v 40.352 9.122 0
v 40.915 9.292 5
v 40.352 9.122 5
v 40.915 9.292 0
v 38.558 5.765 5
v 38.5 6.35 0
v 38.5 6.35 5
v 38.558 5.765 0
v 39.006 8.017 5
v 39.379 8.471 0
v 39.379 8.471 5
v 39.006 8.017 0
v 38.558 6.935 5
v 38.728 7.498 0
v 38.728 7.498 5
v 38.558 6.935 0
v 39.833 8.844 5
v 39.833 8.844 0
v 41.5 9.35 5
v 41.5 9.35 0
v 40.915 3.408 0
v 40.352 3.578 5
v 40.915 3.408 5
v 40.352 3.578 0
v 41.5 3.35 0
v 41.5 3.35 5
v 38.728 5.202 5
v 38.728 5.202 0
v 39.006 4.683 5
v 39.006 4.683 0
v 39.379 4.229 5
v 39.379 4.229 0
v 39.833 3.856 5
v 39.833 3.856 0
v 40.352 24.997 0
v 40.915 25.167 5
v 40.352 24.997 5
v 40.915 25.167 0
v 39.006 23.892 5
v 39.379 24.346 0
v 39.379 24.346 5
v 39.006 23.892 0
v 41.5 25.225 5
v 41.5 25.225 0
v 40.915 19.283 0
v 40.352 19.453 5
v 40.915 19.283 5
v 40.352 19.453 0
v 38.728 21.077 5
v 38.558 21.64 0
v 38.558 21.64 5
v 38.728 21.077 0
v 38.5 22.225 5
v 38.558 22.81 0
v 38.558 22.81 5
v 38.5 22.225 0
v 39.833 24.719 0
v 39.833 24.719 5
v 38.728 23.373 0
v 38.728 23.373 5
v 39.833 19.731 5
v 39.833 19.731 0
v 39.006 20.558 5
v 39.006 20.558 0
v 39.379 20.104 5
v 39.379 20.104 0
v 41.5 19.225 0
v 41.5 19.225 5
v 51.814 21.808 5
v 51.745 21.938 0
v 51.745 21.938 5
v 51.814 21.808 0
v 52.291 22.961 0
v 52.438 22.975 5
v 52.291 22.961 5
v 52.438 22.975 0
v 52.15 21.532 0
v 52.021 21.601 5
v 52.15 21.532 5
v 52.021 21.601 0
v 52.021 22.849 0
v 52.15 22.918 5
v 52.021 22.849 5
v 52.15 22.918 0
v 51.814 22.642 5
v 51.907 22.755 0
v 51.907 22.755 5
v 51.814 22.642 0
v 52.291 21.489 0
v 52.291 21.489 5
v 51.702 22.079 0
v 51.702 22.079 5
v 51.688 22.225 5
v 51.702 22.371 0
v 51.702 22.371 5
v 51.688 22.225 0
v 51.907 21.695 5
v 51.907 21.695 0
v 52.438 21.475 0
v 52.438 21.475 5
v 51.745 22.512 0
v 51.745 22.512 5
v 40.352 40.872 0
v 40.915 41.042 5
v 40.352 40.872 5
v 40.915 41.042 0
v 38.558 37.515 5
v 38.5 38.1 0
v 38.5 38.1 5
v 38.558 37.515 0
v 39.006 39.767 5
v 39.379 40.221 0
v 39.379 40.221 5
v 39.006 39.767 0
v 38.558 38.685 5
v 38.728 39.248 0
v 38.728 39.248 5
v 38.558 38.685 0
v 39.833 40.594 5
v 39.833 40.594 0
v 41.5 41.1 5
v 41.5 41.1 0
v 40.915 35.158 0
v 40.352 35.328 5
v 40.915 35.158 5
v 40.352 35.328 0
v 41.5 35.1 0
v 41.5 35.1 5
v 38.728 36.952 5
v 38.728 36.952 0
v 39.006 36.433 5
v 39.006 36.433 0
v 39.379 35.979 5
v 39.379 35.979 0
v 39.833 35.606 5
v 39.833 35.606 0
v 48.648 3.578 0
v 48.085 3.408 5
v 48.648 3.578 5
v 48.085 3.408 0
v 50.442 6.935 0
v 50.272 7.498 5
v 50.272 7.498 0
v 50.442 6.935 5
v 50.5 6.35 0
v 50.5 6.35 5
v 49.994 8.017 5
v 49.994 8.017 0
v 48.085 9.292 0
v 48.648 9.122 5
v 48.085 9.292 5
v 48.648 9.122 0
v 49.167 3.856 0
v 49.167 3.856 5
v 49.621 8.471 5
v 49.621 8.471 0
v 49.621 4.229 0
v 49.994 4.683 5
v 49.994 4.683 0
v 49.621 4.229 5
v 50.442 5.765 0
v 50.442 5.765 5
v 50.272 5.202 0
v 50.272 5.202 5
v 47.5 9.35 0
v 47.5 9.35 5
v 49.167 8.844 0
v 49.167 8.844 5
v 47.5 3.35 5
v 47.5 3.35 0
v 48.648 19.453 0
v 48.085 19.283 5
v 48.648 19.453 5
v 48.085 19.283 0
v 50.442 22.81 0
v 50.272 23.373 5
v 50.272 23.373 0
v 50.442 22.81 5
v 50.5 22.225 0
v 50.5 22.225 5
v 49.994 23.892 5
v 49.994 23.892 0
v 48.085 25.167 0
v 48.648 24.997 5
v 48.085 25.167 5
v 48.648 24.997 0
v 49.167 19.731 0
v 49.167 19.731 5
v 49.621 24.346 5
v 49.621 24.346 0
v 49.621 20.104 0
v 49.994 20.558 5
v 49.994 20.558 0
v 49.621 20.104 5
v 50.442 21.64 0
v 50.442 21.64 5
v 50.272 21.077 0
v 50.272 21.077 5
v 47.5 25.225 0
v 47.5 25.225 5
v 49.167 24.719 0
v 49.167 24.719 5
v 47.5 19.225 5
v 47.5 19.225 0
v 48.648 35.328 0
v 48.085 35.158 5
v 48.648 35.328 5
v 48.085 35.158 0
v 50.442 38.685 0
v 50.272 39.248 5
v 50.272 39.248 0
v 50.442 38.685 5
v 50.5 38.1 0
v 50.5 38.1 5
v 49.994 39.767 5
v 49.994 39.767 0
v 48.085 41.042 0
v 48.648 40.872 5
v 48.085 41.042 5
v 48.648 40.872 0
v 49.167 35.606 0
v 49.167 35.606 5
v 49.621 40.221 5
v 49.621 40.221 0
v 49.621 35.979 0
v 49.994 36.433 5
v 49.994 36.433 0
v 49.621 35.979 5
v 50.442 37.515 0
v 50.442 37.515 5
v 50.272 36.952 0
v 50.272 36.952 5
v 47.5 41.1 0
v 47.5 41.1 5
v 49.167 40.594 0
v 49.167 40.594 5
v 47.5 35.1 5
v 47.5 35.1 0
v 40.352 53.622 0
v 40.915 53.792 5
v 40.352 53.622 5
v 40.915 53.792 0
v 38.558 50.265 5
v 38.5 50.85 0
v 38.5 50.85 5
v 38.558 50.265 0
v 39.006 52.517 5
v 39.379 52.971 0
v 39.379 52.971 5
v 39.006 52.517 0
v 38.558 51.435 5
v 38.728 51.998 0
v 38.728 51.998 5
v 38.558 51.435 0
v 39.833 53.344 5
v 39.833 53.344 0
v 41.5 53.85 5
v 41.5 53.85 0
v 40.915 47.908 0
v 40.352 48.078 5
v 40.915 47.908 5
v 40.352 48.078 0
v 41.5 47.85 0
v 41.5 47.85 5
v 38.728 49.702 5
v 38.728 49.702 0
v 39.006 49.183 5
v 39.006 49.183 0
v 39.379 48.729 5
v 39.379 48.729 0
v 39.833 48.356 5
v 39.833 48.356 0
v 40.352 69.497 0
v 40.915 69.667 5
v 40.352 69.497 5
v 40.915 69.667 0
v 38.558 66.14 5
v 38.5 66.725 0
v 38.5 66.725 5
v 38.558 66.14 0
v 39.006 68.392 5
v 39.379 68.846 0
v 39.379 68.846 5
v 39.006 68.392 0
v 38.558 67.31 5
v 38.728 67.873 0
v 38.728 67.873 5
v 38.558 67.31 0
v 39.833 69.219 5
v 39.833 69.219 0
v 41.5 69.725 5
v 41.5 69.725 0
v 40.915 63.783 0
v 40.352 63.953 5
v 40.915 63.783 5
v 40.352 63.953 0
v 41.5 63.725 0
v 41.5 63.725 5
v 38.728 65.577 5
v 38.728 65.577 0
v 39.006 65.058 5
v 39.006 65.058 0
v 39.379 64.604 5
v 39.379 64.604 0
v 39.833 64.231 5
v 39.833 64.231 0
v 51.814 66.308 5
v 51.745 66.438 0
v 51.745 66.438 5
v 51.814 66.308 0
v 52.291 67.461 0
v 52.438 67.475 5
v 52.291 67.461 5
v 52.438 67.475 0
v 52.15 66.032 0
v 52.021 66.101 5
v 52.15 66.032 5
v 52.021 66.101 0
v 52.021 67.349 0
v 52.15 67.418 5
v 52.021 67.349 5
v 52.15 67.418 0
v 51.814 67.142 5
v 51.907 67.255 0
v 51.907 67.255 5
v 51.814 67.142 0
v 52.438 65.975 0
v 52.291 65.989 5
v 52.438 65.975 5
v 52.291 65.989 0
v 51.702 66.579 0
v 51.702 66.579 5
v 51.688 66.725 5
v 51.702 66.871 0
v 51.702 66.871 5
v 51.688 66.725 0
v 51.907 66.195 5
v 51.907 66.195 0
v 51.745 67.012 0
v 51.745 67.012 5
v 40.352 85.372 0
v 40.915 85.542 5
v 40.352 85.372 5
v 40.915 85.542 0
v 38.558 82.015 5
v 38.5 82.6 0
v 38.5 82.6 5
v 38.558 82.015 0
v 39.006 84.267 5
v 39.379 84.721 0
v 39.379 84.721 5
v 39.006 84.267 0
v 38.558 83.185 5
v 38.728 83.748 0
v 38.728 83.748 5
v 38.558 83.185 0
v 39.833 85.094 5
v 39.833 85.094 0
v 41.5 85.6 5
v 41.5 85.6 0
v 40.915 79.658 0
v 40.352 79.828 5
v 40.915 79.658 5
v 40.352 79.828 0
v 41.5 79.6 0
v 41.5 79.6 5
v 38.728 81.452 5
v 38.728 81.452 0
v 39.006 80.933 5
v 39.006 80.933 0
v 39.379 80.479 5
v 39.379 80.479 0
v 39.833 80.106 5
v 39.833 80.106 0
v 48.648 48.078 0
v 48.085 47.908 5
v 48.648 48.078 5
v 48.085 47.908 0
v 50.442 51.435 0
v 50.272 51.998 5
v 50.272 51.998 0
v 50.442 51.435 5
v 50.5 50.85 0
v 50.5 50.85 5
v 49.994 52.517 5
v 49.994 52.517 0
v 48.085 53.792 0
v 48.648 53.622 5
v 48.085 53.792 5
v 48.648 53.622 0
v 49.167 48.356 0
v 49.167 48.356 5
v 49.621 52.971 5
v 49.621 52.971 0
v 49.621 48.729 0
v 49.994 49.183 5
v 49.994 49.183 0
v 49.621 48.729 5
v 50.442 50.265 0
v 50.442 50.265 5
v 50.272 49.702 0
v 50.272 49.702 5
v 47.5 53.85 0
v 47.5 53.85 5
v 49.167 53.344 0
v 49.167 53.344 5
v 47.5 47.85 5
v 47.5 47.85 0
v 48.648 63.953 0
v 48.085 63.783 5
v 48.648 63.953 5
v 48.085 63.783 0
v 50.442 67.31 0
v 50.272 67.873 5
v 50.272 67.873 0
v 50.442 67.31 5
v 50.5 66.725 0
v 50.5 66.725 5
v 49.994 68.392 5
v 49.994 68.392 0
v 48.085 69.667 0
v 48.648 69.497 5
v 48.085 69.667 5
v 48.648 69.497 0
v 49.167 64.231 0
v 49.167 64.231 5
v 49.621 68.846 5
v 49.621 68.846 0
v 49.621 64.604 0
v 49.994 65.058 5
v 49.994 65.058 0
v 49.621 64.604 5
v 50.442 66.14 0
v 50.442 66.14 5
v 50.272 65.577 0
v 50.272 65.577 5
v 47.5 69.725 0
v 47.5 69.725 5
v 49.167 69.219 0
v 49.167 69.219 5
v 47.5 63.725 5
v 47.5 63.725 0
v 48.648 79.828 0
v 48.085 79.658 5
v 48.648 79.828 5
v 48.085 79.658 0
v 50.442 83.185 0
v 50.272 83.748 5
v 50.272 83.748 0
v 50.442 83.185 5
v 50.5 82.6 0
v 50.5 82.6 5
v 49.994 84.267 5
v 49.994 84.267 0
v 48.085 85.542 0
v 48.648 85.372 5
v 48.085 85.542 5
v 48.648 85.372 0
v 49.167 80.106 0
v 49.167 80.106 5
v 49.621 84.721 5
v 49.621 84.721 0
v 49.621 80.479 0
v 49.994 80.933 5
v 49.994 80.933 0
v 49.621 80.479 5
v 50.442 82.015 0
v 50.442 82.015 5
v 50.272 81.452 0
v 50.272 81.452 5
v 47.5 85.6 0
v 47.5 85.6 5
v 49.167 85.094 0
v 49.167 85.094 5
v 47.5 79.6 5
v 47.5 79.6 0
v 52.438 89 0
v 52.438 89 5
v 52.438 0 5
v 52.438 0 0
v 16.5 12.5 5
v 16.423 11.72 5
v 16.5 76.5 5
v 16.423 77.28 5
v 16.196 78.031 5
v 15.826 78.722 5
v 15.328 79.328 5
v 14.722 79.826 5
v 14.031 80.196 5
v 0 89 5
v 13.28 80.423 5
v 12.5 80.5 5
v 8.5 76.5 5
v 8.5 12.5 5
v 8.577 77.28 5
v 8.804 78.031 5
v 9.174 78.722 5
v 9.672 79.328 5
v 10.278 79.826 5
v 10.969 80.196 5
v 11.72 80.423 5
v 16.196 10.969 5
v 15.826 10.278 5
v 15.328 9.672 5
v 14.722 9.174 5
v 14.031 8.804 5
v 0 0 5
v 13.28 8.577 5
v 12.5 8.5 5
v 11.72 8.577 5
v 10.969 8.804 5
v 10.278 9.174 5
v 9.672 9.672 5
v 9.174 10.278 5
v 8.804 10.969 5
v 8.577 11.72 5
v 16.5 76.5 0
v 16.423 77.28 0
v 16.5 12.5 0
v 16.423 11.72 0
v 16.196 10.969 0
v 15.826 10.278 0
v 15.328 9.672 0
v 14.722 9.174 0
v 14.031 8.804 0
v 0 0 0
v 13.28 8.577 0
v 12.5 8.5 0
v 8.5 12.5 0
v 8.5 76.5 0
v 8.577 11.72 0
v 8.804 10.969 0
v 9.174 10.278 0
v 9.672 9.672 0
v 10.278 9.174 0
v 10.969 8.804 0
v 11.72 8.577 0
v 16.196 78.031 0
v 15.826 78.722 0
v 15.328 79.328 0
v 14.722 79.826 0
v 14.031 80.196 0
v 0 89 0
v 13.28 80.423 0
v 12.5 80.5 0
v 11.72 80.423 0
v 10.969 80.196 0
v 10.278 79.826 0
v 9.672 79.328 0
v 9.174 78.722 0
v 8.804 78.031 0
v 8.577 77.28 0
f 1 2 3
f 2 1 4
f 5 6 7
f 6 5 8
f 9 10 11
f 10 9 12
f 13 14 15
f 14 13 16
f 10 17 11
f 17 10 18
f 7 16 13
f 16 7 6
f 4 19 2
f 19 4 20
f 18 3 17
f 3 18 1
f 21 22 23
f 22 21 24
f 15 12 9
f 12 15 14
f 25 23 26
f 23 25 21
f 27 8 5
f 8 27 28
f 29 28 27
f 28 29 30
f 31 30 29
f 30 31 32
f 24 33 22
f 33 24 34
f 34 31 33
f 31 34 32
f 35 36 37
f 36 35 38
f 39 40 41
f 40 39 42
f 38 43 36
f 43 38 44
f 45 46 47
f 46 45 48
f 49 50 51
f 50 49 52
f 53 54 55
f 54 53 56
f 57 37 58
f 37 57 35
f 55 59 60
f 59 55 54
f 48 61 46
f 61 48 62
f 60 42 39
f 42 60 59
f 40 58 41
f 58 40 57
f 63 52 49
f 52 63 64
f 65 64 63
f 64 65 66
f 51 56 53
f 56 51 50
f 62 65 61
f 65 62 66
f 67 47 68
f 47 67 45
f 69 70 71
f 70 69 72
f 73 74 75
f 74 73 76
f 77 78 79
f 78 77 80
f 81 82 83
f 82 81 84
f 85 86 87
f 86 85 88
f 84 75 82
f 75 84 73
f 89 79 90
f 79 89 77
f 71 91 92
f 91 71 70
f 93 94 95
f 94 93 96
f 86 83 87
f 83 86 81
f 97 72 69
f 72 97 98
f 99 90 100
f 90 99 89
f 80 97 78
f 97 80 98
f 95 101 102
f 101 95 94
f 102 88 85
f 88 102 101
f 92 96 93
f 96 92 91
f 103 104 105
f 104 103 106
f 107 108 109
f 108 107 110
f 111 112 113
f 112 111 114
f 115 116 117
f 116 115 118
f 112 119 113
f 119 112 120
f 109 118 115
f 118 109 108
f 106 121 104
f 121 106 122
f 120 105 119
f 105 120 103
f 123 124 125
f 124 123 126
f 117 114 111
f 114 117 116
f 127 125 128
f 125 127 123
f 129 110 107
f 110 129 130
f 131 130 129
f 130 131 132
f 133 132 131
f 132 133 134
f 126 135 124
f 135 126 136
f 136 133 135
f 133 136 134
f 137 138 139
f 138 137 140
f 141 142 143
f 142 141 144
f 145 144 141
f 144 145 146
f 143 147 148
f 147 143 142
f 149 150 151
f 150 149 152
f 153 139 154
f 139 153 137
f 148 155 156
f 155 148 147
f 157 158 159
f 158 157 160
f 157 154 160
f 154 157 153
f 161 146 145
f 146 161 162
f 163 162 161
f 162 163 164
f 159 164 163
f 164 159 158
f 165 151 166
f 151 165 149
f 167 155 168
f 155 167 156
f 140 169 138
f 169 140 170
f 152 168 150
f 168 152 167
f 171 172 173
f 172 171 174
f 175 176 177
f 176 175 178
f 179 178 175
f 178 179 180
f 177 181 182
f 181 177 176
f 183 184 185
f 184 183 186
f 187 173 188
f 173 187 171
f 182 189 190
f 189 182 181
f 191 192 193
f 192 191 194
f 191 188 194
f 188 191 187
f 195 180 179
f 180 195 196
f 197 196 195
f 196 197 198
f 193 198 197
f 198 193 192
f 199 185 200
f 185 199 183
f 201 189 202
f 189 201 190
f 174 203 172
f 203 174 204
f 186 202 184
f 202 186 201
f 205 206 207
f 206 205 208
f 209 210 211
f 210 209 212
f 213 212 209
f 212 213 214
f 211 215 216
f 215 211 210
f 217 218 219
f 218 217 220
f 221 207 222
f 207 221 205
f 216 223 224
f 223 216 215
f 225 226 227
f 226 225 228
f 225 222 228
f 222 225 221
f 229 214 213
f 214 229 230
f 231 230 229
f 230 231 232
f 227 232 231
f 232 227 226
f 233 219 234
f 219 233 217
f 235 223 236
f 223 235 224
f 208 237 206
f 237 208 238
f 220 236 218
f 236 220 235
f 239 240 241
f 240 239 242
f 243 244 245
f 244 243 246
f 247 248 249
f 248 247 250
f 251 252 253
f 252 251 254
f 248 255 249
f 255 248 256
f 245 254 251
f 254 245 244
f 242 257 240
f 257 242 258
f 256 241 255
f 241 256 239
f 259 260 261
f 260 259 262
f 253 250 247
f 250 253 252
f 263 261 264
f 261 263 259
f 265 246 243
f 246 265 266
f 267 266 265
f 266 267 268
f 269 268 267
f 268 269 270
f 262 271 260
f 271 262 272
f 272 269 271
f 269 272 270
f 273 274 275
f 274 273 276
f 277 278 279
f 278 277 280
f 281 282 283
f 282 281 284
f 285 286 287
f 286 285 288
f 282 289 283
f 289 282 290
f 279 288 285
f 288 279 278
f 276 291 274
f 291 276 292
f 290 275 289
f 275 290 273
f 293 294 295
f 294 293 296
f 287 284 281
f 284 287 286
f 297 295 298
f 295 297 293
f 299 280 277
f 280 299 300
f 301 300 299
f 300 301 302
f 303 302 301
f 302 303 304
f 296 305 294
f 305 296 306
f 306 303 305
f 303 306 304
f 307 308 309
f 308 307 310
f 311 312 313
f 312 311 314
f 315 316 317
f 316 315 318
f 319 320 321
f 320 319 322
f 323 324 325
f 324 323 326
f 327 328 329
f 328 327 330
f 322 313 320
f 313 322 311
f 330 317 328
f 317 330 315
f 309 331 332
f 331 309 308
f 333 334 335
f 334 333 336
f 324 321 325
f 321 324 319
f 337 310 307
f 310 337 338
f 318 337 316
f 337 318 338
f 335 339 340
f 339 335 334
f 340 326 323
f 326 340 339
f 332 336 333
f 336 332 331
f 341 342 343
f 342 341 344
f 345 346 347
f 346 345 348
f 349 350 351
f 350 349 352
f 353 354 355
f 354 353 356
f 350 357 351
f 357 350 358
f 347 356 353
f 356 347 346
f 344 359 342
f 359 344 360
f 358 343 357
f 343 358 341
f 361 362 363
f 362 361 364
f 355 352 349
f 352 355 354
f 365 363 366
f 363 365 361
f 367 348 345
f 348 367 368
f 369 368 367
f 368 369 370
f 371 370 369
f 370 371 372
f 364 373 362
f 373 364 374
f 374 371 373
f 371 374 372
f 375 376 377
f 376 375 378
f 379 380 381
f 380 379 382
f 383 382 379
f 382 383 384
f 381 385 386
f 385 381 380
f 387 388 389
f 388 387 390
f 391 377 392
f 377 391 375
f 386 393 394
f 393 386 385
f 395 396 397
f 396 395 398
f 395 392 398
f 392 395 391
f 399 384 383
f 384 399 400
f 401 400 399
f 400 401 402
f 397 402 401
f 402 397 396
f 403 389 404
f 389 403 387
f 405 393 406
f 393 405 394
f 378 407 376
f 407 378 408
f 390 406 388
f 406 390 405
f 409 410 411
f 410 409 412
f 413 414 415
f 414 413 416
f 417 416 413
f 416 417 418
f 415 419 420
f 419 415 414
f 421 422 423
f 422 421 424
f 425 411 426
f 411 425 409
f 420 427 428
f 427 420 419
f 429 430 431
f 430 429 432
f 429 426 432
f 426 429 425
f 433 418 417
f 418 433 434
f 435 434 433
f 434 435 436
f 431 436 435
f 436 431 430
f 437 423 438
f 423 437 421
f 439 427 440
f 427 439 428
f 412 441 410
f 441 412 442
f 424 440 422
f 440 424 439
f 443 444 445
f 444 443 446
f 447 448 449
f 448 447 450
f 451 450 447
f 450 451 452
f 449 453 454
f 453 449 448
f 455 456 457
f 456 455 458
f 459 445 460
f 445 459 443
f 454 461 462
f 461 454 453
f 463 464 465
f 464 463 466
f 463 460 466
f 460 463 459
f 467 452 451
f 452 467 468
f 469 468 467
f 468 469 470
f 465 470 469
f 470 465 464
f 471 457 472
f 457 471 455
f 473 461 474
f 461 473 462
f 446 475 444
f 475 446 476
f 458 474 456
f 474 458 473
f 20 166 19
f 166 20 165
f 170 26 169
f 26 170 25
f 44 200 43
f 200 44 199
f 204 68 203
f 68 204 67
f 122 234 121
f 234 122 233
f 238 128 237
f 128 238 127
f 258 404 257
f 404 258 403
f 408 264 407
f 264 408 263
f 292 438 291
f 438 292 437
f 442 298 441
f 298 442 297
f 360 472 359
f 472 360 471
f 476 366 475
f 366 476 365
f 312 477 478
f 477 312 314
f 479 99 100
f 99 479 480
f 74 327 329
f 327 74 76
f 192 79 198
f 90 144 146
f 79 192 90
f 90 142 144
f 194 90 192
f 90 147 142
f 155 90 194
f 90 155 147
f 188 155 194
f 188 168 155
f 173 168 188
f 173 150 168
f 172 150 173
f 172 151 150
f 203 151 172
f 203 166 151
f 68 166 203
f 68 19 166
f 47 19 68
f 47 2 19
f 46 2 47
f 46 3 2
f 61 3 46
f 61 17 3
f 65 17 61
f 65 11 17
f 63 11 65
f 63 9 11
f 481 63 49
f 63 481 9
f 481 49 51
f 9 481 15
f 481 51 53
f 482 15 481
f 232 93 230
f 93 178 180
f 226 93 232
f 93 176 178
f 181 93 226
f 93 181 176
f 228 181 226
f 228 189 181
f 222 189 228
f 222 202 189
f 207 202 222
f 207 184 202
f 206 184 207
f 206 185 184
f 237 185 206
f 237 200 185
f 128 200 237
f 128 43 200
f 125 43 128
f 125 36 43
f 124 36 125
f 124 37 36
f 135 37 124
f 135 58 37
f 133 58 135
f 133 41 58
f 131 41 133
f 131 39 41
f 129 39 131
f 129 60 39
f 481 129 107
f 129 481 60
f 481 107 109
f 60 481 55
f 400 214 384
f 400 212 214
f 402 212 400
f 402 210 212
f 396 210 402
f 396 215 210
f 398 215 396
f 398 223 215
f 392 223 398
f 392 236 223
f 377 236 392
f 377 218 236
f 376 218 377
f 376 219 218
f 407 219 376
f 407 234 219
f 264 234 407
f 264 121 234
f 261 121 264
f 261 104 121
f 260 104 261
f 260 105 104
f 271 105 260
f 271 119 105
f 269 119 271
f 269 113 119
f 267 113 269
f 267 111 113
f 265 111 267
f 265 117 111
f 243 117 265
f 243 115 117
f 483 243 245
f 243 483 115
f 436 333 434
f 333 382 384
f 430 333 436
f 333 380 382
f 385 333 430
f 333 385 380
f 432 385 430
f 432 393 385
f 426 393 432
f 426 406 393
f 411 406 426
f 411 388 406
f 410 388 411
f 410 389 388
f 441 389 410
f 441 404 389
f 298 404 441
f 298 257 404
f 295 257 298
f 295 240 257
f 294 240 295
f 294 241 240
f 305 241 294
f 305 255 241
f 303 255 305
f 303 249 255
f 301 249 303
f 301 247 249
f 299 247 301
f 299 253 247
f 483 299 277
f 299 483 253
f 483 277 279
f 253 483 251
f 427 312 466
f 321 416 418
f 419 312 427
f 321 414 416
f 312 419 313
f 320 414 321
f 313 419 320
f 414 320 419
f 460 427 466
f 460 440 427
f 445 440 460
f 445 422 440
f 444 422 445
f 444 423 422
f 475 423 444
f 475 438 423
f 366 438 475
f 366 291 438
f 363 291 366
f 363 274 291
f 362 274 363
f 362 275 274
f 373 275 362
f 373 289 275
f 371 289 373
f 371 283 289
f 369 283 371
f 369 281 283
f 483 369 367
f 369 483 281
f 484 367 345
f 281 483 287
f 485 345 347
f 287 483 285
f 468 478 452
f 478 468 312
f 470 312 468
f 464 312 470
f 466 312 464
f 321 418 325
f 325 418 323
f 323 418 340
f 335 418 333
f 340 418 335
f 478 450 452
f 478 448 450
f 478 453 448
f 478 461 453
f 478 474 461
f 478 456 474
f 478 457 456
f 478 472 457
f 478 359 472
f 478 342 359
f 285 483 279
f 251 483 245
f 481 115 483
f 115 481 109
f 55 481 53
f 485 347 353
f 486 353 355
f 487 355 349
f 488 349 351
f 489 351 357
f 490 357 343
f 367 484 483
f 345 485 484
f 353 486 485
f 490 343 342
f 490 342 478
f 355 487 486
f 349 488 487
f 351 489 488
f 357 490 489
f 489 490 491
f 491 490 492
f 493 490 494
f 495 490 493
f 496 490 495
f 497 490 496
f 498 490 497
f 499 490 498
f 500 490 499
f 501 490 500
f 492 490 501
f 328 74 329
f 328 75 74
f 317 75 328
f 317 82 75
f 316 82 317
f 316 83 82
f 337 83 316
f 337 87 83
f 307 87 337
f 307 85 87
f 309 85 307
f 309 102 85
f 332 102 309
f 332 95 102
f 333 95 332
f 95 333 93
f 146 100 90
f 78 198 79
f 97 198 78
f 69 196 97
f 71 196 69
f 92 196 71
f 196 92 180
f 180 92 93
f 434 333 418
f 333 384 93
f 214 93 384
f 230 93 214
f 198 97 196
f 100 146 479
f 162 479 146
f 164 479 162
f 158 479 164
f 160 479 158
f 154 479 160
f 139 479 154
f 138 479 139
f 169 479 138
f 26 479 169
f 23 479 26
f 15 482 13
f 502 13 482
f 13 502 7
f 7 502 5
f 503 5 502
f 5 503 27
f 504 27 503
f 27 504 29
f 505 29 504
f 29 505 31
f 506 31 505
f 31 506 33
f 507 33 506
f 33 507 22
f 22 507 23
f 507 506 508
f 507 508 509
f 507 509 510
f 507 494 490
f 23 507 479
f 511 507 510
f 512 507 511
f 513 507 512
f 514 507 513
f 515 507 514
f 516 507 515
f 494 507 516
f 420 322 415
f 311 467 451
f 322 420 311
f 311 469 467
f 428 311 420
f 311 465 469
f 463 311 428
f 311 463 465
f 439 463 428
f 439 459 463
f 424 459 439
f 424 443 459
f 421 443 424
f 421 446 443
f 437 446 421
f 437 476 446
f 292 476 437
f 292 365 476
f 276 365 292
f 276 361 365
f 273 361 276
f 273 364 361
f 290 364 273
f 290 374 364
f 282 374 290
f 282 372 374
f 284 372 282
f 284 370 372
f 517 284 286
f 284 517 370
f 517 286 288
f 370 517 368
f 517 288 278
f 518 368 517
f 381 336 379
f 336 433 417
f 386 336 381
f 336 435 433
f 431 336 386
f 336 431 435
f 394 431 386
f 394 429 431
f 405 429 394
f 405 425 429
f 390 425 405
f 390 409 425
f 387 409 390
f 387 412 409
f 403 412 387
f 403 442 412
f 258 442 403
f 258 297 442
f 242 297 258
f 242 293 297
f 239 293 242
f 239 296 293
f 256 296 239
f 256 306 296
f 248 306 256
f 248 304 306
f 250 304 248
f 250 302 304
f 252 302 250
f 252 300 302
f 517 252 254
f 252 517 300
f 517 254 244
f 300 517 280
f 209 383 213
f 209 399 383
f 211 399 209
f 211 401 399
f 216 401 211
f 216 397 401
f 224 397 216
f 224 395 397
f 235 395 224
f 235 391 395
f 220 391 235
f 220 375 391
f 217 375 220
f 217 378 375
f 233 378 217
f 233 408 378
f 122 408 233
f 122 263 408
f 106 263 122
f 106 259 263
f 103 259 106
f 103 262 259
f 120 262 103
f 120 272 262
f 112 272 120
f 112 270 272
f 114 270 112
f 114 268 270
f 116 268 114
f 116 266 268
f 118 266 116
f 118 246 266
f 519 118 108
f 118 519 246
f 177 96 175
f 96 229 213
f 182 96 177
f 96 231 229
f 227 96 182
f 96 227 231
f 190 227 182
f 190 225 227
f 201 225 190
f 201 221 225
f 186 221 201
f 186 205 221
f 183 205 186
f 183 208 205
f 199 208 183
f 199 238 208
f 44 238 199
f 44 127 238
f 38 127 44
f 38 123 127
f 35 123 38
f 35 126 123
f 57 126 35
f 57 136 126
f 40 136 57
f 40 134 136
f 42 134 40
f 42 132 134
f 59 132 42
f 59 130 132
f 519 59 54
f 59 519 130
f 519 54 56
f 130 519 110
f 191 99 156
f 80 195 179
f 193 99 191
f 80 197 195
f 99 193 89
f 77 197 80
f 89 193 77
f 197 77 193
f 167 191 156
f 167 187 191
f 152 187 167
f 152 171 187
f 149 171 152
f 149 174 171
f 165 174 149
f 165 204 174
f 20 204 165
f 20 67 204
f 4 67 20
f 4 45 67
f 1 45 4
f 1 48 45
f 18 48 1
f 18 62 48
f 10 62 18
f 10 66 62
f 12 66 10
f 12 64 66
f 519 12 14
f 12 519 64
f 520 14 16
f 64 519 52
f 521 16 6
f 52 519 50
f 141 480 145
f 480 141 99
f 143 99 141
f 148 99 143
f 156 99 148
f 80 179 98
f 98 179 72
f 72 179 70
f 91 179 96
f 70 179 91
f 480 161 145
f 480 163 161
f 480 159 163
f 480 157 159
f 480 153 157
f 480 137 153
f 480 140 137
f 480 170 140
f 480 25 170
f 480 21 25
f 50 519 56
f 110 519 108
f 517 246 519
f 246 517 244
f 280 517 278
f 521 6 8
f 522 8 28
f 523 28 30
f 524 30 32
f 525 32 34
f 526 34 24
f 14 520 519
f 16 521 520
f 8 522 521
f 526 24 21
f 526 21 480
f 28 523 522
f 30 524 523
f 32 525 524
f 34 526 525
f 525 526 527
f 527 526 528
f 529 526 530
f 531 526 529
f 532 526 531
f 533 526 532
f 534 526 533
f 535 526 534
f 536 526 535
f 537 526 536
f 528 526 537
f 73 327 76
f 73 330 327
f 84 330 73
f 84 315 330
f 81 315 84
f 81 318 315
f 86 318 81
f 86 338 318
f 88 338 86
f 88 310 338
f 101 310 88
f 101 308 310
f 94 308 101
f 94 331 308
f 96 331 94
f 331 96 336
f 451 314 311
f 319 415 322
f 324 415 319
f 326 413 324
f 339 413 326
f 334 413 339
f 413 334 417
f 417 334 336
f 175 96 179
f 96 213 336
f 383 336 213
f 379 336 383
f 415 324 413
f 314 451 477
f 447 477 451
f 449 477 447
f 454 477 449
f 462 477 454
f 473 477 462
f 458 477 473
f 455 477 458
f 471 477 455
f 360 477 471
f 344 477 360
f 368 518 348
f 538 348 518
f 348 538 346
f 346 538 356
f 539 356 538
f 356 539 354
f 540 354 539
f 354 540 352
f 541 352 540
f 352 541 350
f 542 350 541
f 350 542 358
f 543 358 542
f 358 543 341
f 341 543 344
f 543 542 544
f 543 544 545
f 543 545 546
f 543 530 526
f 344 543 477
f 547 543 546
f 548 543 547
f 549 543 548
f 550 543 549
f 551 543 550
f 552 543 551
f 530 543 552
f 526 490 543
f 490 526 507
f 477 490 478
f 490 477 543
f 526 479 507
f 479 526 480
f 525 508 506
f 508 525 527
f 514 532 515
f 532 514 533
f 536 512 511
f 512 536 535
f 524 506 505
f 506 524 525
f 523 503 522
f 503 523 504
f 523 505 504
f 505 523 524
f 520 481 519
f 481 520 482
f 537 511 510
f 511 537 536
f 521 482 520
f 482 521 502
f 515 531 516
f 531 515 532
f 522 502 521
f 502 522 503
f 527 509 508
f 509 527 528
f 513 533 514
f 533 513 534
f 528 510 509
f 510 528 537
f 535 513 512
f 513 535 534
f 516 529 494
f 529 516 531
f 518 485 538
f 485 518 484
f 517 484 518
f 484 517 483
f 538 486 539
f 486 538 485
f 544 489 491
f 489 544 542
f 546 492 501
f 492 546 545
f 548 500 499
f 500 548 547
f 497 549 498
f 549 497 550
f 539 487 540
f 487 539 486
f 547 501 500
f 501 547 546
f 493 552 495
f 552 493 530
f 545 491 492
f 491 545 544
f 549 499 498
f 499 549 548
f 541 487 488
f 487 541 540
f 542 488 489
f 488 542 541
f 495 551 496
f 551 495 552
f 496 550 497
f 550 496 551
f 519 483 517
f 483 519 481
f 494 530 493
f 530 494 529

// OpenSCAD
width = 25/2 + 32 + 15.875/2;
height = 44.5 * 2; // 2U

module adapter(){    
    screw_hole_diameter = 6;
    difference() {
        // Base
        cube([width,height,5]);
        // Agujeros estandar
        translate([width - 15.875/2, 0, 0]) for (i=[0:44.50:44.50]) {
            for (j=[-screw_hole_diameter/2:screw_hole_diameter:screw_hole_diameter/2]) {
                translate([j,i + 6.35,-0.001]) cylinder(d = screw_hole_diameter, h = 5 + 0.002, center = false, $fn = 32);                
                translate([j,i + 6.35 + 15.875,-0.001]) cylinder(d = screw_hole_diameter, h = 5 + 0.002, center = false, $fn = 32);
                // Hacemos una marca para posicionar el centro de la U
                translate([15.875 / 2,i + 6.35 + 15.875,-0.001]) cylinder(d = 1.5, h = 5 + 0.002, center = false, $fn = 32);
                translate([j,i + 6.35 + 15.875 + 15.875,-0.001]) cylinder(d = screw_hole_diameter, h = 5 + 0.002, center = false, $fn = 32);
            }
            translate([-screw_hole_diameter / 2,i + 6.35 - screw_hole_diameter / 2,-0.001]) cube([screw_hole_diameter, screw_hole_diameter, 5 + 0.002], center = false);
            translate([-screw_hole_diameter / 2,i + 6.35 + 15.875 - screw_hole_diameter / 2,-0.001]) cube([screw_hole_diameter, screw_hole_diameter, 5 + 0.002], center = false);
            translate([-screw_hole_diameter / 2,i + 6.35 + 15.875 + 15.875 - screw_hole_diameter / 2,-0.001]) cube([screw_hole_diameter, screw_hole_diameter, 5 + 0.002], center = false);
        }
        translate([25/2,25 / 2,-0.001]) cylinder(d = 8, h = 5 + 0.002, center = false, $fn = 32);
        translate([25/2,height - 25 / 2,-0.001]) cylinder(d = 8, h = 5 + 0.002, center = false, $fn = 32);
        translate([25/2 - 8/2,25 / 2,-0.001]) cube([8, height - 25,5 + 0.002]);
    }
}

adapter();
